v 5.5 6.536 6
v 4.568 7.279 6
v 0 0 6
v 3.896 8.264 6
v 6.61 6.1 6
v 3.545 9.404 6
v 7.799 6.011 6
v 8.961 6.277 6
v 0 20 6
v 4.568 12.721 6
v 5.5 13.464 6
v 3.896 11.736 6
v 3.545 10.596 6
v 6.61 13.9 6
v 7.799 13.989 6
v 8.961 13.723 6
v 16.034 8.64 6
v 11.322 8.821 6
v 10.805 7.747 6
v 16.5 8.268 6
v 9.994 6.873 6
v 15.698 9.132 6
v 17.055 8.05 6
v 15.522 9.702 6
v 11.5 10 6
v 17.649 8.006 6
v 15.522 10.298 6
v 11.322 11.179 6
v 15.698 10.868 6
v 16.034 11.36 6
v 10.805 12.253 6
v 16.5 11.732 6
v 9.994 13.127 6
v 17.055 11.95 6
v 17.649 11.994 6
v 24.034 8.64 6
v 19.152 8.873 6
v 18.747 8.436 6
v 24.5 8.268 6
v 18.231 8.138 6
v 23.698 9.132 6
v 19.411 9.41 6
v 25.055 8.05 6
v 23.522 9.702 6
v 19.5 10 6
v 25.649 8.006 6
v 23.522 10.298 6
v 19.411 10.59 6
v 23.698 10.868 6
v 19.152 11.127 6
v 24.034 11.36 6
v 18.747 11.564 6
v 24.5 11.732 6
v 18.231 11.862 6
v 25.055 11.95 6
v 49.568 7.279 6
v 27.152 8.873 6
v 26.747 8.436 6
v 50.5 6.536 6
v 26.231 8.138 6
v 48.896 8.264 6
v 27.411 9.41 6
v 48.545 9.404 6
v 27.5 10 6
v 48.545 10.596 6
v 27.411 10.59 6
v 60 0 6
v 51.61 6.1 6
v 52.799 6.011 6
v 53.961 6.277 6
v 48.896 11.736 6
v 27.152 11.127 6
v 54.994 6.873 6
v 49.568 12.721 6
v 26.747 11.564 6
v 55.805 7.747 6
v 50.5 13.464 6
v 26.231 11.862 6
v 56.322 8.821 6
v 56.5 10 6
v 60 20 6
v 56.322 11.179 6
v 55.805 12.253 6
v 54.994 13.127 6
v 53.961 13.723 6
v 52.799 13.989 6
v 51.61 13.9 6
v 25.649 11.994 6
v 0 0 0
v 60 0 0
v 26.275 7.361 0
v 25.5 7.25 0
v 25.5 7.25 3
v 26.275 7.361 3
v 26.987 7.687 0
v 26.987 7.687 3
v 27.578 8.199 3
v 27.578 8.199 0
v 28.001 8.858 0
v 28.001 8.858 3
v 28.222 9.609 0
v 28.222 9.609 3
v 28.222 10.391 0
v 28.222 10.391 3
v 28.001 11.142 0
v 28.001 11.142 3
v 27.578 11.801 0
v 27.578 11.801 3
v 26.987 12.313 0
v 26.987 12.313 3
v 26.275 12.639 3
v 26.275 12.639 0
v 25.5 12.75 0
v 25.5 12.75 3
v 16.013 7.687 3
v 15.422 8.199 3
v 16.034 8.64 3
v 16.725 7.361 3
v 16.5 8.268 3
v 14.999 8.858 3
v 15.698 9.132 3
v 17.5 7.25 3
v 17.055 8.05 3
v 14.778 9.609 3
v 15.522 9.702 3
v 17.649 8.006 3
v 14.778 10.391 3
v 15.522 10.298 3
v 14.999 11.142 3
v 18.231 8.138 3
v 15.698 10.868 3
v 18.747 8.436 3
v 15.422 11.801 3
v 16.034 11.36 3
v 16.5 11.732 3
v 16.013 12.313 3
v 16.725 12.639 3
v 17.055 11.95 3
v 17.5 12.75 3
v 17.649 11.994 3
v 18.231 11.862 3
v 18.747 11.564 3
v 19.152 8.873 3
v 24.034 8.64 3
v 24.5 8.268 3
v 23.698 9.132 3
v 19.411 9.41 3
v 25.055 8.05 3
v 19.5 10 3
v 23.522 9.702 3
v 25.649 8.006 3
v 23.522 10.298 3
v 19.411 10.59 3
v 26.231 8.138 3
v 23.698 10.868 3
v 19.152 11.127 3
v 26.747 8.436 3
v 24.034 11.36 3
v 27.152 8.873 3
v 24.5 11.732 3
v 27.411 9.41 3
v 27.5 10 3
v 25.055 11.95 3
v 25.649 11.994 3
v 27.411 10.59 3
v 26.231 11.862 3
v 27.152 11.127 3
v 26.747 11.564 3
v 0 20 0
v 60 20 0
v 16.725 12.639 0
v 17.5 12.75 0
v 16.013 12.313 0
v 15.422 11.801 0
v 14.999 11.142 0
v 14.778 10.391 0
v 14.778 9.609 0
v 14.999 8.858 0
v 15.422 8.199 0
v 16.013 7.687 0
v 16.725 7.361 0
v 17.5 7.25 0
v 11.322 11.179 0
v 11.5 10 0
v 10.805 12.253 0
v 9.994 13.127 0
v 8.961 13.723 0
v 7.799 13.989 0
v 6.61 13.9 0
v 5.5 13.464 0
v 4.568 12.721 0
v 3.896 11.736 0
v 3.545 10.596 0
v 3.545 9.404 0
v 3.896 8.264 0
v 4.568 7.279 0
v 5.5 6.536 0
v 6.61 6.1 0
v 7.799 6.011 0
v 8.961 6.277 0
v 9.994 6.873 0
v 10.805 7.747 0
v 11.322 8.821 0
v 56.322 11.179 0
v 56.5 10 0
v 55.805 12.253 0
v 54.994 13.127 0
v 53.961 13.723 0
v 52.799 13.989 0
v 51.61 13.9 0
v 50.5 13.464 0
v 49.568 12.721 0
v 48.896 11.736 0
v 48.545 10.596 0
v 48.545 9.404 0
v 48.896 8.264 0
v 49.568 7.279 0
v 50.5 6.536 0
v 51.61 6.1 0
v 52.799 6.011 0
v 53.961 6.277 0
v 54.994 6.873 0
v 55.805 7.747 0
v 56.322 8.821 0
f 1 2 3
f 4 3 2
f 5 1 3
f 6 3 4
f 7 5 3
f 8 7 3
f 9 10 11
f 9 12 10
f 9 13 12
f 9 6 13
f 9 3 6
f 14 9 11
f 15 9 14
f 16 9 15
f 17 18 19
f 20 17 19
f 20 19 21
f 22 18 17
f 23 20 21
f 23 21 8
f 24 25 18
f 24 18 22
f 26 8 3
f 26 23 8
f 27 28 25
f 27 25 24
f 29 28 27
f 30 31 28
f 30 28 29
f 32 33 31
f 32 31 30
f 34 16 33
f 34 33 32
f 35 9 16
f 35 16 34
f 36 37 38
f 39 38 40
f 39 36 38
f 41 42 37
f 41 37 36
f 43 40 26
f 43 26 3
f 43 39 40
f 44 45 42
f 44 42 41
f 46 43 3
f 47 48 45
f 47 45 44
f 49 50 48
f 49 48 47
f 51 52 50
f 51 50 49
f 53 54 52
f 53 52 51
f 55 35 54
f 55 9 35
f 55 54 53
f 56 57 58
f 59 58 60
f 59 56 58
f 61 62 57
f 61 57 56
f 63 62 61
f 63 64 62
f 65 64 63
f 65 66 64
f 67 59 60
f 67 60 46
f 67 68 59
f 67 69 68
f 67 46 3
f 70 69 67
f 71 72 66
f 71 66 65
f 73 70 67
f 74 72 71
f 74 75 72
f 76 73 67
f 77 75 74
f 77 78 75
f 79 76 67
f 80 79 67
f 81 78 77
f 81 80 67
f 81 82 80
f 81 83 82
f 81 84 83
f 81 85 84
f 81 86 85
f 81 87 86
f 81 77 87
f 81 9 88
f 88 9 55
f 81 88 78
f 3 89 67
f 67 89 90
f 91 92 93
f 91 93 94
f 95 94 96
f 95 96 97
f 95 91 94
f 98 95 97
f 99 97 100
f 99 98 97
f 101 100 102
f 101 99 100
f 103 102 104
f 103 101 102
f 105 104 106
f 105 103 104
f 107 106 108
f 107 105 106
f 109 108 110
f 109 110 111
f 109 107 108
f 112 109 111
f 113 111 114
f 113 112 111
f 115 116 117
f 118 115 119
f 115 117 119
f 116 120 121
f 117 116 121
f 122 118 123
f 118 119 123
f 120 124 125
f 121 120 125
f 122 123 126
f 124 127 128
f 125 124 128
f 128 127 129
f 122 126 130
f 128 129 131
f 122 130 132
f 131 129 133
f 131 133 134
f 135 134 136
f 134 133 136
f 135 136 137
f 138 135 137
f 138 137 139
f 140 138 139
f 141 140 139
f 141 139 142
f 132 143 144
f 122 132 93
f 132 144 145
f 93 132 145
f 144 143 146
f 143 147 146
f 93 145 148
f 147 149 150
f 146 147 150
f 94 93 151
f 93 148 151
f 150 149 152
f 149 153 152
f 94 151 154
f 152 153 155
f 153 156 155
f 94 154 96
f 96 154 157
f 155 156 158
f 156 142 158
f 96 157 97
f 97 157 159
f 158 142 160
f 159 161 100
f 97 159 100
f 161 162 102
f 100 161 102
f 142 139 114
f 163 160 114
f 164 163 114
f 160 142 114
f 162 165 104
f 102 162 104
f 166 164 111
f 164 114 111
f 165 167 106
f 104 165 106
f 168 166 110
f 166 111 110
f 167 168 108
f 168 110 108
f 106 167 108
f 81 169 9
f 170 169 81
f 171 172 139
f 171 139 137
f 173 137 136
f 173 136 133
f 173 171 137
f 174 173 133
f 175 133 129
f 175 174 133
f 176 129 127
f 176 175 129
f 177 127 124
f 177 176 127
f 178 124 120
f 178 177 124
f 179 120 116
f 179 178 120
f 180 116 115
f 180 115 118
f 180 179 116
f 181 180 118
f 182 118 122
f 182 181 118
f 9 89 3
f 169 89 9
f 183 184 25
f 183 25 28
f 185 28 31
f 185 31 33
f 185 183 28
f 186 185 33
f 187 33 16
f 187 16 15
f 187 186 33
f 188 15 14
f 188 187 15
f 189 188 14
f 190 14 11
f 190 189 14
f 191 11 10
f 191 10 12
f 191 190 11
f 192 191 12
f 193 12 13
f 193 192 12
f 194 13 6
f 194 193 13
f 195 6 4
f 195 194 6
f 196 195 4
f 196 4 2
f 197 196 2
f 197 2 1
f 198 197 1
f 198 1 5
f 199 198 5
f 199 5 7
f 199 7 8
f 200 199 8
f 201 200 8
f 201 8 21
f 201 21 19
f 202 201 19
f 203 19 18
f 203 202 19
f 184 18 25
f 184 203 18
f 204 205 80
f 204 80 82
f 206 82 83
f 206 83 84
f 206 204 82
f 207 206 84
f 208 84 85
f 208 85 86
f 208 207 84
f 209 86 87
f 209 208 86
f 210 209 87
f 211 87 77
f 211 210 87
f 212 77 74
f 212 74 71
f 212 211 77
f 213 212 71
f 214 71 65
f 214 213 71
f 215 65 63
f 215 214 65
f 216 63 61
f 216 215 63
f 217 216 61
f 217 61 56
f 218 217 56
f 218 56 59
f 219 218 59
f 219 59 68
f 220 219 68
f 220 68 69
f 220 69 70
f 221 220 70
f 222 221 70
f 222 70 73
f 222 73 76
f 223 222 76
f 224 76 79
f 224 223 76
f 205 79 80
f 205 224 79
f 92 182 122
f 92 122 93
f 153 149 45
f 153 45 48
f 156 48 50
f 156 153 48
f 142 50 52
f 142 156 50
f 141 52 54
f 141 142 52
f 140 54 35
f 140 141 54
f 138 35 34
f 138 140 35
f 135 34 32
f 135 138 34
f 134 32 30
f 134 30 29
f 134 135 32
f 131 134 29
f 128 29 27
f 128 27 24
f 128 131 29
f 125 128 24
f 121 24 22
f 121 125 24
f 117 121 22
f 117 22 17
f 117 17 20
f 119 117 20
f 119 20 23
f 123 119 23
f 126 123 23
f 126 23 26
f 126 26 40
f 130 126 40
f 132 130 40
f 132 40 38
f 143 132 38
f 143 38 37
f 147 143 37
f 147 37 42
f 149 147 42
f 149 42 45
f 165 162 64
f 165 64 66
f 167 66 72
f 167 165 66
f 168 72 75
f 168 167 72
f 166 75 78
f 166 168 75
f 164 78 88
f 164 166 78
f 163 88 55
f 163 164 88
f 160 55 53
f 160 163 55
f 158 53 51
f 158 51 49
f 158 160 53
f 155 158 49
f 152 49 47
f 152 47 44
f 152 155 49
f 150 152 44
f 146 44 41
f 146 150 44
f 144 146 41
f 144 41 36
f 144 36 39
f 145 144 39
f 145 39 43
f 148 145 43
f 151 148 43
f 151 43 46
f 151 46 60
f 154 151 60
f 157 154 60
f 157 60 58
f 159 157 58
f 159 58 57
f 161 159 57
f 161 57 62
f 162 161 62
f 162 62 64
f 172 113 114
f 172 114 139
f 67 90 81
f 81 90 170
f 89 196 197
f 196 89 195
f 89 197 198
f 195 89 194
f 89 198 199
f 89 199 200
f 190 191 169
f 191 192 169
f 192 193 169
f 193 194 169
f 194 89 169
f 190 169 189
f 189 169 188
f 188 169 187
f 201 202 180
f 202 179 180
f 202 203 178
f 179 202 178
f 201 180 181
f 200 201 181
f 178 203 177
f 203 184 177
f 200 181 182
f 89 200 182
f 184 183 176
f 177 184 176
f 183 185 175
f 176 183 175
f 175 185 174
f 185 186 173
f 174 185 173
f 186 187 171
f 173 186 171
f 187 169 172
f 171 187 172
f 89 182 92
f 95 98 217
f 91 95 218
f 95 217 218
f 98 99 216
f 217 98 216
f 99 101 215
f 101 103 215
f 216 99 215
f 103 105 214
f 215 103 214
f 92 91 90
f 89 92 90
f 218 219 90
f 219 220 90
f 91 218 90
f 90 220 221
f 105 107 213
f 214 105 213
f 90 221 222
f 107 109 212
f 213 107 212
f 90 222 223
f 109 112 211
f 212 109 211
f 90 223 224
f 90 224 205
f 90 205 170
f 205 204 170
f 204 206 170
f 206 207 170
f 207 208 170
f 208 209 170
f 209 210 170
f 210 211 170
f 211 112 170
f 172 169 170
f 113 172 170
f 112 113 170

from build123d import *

# Parameters (mm, degrees)
SKETCH_1_W          = 60
SKETCH_1_H          = 20
SKETCH_1_R          = 4
SKETCH_1_R_2        = 2
EXTRUDE_1_DEPTH     = 6
CUT_EXTRUDE_1_DEPTH = 3


with BuildPart() as part:
    # 草圖1 → 填料-伸長1 (new body)
    with BuildSketch(Plane.XY):
        with Locations((30, 10)):
            Rectangle(SKETCH_1_W, SKETCH_1_H)
        with Locations((7.5, 10)):
            Circle(SKETCH_1_R, mode=Mode.SUBTRACT)
        with Locations((17.5, 10)):
            Circle(SKETCH_1_R_2, mode=Mode.SUBTRACT)
        with Locations((25.5, 10)):
            Circle(SKETCH_1_R_2, mode=Mode.SUBTRACT)
        with Locations((52.5, 10)):
            Circle(SKETCH_1_R, mode=Mode.SUBTRACT)
    extrude(amount=EXTRUDE_1_DEPTH)

    # 草圖3 → 除料-伸長1 (cut)
    with BuildSketch(Plane(origin=(0, 0, 0), x_dir=(-1, 0, 0), z_dir=(0, 0, -1))):
        with BuildLine():
            Line((-25.5, 12.75), (-17.5, 12.75))
            ThreePointArc((-17.5, 12.75), (-14.75, 10), (-17.5, 7.25))
            Line((-17.5, 7.25), (-25.5, 7.25))
            ThreePointArc((-25.5, 7.25), (-28.25, 10), (-25.5, 12.75))
        make_face()
    extrude(amount=-CUT_EXTRUDE_1_DEPTH, mode=Mode.SUBTRACT)


solid = part.part
